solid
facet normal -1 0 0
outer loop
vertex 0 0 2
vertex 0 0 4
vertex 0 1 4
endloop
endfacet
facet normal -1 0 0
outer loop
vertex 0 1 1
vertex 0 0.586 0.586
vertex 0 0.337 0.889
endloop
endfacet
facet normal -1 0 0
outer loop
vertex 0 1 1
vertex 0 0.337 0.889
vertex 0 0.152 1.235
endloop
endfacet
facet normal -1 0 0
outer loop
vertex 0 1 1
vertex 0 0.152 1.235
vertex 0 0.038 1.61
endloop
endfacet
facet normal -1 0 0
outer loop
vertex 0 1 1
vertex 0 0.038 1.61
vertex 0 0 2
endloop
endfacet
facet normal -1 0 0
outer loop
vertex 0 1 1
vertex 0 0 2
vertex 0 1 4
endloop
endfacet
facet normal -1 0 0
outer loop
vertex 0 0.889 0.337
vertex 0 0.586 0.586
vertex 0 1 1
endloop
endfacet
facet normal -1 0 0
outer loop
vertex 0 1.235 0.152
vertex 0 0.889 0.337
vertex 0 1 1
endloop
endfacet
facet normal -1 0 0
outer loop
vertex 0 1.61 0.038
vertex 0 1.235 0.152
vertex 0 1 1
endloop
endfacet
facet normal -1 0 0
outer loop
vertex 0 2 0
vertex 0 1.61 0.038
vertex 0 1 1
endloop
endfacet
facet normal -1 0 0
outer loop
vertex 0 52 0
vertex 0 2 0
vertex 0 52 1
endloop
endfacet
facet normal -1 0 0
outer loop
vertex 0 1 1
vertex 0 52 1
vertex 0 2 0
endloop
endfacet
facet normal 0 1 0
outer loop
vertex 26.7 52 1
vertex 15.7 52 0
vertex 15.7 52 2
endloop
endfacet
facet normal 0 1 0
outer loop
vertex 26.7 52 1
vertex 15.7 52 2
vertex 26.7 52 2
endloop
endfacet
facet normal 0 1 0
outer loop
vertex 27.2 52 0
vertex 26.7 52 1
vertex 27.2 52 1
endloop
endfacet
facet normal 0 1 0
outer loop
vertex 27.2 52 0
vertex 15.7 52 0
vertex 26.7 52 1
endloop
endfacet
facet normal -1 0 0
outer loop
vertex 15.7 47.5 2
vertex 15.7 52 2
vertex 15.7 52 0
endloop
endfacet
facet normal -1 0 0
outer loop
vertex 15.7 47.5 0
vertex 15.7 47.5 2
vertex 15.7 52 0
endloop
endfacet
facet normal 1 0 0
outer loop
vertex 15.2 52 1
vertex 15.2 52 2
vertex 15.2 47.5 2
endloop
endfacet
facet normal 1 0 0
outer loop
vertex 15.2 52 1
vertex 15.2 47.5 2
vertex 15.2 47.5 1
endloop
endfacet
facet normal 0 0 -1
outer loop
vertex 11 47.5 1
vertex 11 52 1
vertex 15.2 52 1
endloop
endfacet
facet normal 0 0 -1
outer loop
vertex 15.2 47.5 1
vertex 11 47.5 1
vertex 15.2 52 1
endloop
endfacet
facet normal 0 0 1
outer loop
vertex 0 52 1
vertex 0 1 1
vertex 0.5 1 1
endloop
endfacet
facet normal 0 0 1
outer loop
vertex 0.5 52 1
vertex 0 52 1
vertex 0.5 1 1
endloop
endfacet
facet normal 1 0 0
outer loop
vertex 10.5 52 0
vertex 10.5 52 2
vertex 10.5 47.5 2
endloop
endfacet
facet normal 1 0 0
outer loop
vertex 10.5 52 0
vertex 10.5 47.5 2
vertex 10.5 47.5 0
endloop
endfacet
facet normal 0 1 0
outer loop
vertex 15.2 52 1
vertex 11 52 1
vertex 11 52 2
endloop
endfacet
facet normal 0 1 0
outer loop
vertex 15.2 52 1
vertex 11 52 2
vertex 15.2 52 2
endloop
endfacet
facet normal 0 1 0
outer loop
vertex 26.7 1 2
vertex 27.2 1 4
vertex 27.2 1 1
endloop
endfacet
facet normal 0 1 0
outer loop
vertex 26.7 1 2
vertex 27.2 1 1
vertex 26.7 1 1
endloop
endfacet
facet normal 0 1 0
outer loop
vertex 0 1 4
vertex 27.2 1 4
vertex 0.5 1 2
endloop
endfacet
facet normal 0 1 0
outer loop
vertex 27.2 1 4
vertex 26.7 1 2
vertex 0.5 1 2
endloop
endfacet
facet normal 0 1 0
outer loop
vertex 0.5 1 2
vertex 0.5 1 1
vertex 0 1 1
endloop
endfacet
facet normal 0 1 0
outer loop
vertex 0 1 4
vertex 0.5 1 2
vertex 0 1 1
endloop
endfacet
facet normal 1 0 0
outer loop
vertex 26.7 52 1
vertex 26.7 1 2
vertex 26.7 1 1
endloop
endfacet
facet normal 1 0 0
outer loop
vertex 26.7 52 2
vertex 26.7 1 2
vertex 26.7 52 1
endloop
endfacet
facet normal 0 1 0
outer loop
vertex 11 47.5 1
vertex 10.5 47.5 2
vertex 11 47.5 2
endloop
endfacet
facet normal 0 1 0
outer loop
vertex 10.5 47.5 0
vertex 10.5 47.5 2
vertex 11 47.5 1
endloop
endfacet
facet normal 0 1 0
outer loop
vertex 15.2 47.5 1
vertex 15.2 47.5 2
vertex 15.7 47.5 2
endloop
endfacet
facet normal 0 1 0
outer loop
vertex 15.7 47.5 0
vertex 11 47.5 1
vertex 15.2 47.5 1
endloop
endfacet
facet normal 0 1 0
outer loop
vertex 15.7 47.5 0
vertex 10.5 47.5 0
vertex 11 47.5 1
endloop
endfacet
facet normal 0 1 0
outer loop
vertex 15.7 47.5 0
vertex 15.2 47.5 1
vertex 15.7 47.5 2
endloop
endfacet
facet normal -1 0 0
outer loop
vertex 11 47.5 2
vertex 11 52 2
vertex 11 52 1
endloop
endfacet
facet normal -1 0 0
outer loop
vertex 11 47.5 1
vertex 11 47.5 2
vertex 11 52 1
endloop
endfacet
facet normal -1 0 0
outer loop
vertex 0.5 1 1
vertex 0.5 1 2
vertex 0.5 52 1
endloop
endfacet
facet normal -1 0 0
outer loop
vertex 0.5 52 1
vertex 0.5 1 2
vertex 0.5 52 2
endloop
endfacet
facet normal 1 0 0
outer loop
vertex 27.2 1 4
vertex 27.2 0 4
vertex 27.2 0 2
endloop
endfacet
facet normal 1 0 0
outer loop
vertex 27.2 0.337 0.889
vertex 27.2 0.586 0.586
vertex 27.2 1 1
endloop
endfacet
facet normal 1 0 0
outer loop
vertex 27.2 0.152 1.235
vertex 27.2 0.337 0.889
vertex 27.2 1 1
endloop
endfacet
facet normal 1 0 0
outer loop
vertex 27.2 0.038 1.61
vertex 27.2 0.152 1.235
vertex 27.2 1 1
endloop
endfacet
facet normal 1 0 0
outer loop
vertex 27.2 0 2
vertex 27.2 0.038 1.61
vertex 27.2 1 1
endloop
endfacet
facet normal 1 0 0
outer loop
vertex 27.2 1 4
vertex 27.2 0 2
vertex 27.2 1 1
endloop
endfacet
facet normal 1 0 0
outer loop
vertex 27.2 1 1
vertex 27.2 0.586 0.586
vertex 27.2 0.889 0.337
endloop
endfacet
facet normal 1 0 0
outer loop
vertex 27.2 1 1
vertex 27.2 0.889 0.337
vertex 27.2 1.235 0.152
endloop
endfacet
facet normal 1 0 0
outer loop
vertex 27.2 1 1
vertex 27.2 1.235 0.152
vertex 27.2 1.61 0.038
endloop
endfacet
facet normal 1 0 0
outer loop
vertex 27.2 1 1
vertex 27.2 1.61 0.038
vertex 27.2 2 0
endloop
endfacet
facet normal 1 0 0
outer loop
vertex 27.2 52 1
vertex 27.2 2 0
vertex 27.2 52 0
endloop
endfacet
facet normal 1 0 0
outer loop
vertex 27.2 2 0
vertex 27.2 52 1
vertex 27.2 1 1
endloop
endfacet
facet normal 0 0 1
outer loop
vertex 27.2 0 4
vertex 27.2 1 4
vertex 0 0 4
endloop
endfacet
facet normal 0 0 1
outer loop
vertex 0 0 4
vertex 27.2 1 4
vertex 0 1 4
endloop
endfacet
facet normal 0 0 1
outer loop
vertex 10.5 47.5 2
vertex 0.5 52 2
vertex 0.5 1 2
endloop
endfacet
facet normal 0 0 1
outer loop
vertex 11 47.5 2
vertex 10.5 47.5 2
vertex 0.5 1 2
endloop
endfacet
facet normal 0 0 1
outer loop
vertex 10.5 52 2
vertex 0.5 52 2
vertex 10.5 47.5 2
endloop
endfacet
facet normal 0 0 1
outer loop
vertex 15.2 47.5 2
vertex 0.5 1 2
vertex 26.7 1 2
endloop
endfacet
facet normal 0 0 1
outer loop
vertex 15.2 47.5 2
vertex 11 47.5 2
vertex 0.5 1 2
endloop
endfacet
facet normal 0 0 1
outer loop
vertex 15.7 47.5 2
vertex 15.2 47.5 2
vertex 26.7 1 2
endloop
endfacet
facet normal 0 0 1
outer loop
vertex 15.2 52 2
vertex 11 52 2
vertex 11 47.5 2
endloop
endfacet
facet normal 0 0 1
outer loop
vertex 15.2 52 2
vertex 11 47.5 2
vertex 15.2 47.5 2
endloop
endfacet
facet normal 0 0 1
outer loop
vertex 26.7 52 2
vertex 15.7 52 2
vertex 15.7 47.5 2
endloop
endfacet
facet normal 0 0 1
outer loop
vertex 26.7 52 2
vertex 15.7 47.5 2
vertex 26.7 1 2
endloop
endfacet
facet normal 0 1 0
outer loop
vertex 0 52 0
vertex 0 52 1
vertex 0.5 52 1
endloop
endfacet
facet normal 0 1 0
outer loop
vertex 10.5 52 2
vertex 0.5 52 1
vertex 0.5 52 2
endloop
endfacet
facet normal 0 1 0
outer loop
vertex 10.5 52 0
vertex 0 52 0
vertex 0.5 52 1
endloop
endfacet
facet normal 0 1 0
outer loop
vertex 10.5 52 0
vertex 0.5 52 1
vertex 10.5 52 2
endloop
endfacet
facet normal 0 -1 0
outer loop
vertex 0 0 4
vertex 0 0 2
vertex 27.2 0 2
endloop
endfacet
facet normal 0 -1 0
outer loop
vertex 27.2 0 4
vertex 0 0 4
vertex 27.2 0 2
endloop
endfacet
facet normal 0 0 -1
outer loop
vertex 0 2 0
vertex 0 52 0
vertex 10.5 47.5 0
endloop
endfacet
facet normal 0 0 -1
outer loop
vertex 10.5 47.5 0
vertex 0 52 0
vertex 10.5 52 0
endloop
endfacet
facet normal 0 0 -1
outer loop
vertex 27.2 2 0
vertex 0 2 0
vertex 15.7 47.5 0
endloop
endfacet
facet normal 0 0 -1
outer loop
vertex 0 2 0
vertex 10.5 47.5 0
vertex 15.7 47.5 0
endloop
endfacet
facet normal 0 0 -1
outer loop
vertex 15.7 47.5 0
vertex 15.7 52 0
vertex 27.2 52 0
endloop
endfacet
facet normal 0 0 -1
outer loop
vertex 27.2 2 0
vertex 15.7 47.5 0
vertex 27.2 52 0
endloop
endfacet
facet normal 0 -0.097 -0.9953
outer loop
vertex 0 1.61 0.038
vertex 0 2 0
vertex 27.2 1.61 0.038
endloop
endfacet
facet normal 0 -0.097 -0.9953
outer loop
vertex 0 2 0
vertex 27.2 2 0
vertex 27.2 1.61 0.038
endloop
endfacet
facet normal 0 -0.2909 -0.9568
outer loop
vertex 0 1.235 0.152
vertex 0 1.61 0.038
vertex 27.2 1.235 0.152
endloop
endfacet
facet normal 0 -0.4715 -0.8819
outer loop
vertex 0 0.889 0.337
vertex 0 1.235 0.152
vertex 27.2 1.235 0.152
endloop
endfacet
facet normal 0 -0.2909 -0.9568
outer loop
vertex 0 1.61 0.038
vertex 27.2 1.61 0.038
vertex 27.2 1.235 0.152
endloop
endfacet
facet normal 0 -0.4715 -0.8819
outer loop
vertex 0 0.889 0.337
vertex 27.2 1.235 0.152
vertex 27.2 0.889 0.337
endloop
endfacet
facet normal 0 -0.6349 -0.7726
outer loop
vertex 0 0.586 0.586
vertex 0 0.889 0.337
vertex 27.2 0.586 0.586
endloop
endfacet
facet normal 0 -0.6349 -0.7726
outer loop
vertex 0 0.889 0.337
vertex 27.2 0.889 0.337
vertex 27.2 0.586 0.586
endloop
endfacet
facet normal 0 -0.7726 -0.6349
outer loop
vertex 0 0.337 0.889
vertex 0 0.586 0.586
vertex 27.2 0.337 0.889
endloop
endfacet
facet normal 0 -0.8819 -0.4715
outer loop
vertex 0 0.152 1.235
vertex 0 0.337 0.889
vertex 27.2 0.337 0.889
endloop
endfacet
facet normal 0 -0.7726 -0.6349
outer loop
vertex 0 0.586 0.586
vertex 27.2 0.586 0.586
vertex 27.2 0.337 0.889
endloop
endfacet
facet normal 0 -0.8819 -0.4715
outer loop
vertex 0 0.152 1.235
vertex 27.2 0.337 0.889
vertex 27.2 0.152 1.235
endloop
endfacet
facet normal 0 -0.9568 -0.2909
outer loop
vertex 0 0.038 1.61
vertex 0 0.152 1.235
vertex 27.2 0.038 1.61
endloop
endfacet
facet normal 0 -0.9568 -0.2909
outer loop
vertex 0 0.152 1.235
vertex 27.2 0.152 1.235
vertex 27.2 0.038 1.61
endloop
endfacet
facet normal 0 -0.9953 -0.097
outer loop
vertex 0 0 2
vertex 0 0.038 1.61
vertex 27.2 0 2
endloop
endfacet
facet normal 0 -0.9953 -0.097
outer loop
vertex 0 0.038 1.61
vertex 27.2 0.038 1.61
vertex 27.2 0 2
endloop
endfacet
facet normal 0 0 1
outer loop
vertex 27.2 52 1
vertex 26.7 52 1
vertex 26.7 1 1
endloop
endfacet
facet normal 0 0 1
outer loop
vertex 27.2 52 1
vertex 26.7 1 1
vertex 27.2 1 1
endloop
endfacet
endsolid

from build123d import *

# Parameters (mm, degrees)
SKETCH1_W           = 27.2
SKETCH1_H           = 52
BOSS_EXTRUDE1_DEPTH = 2
SKETCH2_W           = 0.5
SKETCH2_H           = 52
CUT_EXTRUDE1_DEPTH  = 1
SKETCH3_W           = 0.5
SKETCH3_H           = 52
CUT_EXTRUDE2_DEPTH  = 1
SKETCH4_W           = 0.5
SKETCH4_H           = 2
CUT_EXTRUDE3_DEPTH  = 4.5
SKETCH5_W           = 0.5
SKETCH5_H           = 2
CUT_EXTRUDE4_DEPTH  = 4.5
SKETCH6_W           = 4.2
SKETCH6_H           = 1
CUT_EXTRUDE5_DEPTH  = 4.5
SKETCH9_W           = 27.2
SKETCH9_H           = 1
BOSS_EXTRUDE3_DEPTH = 4
FILLET1_R           = 2


with BuildPart() as part:
    # Sketch1 → Boss-Extrude1 (new body)
    with BuildSketch(Plane.XY):
        with Locations((13.6, 26)):
            Rectangle(SKETCH1_W, SKETCH1_H)
    extrude(amount=BOSS_EXTRUDE1_DEPTH)

    # Sketch2 → Cut-Extrude1 (cut)
    with BuildSketch(Plane.XY.offset(2)):
        with Locations((0.25, 26)):
            Rectangle(SKETCH2_W, SKETCH2_H)
    extrude(amount=-CUT_EXTRUDE1_DEPTH, mode=Mode.SUBTRACT)

    # Sketch3 → Cut-Extrude2 (cut)
    with BuildSketch(Plane.XY.offset(2)):
        with Locations((26.95, 26)):
            Rectangle(SKETCH3_W, SKETCH3_H)
    extrude(amount=-CUT_EXTRUDE2_DEPTH, mode=Mode.SUBTRACT)

    # Sketch4 → Cut-Extrude3 (cut)
    with BuildSketch(Plane(origin=(0, 52, 0), x_dir=(1, 0, 0), z_dir=(0, 1, 0))):
        with Locations((10.75, -1)):
            Rectangle(SKETCH4_W, SKETCH4_H)
    extrude(amount=-CUT_EXTRUDE3_DEPTH, mode=Mode.SUBTRACT)

    # Sketch5 → Cut-Extrude4 (cut)
    with BuildSketch(Plane(origin=(0, 52, 0), x_dir=(1, 0, 0), z_dir=(0, 1, 0))):
        with Locations((15.45, -1)):
            Rectangle(SKETCH5_W, SKETCH5_H)
    extrude(amount=-CUT_EXTRUDE4_DEPTH, mode=Mode.SUBTRACT)

    # Sketch6 → Cut-Extrude5 (cut)
    with BuildSketch(Plane(origin=(0, 52, 0), x_dir=(1, 0, 0), z_dir=(0, 1, 0))):
        with Locations((13.1, -0.5)):
            Rectangle(SKETCH6_W, SKETCH6_H)
    extrude(amount=-CUT_EXTRUDE5_DEPTH, mode=Mode.SUBTRACT)

    # Sketch9 → Boss-Extrude3 (add)
    with BuildSketch(Plane(origin=(0, 0, 0), x_dir=(-1, 0, 0), z_dir=(0, 0, -1))):
        with Locations((-13.6, 0.5)):
            Rectangle(SKETCH9_W, SKETCH9_H)
    extrude(amount=-BOSS_EXTRUDE3_DEPTH)

    # Fillet1
    fillet1_edges = [part.edges().sort_by_distance(p)[0] for p in [
        (13.6, 0, 0),
    ]]
    fillet(fillet1_edges, radius=FILLET1_R)


solid = part.part
